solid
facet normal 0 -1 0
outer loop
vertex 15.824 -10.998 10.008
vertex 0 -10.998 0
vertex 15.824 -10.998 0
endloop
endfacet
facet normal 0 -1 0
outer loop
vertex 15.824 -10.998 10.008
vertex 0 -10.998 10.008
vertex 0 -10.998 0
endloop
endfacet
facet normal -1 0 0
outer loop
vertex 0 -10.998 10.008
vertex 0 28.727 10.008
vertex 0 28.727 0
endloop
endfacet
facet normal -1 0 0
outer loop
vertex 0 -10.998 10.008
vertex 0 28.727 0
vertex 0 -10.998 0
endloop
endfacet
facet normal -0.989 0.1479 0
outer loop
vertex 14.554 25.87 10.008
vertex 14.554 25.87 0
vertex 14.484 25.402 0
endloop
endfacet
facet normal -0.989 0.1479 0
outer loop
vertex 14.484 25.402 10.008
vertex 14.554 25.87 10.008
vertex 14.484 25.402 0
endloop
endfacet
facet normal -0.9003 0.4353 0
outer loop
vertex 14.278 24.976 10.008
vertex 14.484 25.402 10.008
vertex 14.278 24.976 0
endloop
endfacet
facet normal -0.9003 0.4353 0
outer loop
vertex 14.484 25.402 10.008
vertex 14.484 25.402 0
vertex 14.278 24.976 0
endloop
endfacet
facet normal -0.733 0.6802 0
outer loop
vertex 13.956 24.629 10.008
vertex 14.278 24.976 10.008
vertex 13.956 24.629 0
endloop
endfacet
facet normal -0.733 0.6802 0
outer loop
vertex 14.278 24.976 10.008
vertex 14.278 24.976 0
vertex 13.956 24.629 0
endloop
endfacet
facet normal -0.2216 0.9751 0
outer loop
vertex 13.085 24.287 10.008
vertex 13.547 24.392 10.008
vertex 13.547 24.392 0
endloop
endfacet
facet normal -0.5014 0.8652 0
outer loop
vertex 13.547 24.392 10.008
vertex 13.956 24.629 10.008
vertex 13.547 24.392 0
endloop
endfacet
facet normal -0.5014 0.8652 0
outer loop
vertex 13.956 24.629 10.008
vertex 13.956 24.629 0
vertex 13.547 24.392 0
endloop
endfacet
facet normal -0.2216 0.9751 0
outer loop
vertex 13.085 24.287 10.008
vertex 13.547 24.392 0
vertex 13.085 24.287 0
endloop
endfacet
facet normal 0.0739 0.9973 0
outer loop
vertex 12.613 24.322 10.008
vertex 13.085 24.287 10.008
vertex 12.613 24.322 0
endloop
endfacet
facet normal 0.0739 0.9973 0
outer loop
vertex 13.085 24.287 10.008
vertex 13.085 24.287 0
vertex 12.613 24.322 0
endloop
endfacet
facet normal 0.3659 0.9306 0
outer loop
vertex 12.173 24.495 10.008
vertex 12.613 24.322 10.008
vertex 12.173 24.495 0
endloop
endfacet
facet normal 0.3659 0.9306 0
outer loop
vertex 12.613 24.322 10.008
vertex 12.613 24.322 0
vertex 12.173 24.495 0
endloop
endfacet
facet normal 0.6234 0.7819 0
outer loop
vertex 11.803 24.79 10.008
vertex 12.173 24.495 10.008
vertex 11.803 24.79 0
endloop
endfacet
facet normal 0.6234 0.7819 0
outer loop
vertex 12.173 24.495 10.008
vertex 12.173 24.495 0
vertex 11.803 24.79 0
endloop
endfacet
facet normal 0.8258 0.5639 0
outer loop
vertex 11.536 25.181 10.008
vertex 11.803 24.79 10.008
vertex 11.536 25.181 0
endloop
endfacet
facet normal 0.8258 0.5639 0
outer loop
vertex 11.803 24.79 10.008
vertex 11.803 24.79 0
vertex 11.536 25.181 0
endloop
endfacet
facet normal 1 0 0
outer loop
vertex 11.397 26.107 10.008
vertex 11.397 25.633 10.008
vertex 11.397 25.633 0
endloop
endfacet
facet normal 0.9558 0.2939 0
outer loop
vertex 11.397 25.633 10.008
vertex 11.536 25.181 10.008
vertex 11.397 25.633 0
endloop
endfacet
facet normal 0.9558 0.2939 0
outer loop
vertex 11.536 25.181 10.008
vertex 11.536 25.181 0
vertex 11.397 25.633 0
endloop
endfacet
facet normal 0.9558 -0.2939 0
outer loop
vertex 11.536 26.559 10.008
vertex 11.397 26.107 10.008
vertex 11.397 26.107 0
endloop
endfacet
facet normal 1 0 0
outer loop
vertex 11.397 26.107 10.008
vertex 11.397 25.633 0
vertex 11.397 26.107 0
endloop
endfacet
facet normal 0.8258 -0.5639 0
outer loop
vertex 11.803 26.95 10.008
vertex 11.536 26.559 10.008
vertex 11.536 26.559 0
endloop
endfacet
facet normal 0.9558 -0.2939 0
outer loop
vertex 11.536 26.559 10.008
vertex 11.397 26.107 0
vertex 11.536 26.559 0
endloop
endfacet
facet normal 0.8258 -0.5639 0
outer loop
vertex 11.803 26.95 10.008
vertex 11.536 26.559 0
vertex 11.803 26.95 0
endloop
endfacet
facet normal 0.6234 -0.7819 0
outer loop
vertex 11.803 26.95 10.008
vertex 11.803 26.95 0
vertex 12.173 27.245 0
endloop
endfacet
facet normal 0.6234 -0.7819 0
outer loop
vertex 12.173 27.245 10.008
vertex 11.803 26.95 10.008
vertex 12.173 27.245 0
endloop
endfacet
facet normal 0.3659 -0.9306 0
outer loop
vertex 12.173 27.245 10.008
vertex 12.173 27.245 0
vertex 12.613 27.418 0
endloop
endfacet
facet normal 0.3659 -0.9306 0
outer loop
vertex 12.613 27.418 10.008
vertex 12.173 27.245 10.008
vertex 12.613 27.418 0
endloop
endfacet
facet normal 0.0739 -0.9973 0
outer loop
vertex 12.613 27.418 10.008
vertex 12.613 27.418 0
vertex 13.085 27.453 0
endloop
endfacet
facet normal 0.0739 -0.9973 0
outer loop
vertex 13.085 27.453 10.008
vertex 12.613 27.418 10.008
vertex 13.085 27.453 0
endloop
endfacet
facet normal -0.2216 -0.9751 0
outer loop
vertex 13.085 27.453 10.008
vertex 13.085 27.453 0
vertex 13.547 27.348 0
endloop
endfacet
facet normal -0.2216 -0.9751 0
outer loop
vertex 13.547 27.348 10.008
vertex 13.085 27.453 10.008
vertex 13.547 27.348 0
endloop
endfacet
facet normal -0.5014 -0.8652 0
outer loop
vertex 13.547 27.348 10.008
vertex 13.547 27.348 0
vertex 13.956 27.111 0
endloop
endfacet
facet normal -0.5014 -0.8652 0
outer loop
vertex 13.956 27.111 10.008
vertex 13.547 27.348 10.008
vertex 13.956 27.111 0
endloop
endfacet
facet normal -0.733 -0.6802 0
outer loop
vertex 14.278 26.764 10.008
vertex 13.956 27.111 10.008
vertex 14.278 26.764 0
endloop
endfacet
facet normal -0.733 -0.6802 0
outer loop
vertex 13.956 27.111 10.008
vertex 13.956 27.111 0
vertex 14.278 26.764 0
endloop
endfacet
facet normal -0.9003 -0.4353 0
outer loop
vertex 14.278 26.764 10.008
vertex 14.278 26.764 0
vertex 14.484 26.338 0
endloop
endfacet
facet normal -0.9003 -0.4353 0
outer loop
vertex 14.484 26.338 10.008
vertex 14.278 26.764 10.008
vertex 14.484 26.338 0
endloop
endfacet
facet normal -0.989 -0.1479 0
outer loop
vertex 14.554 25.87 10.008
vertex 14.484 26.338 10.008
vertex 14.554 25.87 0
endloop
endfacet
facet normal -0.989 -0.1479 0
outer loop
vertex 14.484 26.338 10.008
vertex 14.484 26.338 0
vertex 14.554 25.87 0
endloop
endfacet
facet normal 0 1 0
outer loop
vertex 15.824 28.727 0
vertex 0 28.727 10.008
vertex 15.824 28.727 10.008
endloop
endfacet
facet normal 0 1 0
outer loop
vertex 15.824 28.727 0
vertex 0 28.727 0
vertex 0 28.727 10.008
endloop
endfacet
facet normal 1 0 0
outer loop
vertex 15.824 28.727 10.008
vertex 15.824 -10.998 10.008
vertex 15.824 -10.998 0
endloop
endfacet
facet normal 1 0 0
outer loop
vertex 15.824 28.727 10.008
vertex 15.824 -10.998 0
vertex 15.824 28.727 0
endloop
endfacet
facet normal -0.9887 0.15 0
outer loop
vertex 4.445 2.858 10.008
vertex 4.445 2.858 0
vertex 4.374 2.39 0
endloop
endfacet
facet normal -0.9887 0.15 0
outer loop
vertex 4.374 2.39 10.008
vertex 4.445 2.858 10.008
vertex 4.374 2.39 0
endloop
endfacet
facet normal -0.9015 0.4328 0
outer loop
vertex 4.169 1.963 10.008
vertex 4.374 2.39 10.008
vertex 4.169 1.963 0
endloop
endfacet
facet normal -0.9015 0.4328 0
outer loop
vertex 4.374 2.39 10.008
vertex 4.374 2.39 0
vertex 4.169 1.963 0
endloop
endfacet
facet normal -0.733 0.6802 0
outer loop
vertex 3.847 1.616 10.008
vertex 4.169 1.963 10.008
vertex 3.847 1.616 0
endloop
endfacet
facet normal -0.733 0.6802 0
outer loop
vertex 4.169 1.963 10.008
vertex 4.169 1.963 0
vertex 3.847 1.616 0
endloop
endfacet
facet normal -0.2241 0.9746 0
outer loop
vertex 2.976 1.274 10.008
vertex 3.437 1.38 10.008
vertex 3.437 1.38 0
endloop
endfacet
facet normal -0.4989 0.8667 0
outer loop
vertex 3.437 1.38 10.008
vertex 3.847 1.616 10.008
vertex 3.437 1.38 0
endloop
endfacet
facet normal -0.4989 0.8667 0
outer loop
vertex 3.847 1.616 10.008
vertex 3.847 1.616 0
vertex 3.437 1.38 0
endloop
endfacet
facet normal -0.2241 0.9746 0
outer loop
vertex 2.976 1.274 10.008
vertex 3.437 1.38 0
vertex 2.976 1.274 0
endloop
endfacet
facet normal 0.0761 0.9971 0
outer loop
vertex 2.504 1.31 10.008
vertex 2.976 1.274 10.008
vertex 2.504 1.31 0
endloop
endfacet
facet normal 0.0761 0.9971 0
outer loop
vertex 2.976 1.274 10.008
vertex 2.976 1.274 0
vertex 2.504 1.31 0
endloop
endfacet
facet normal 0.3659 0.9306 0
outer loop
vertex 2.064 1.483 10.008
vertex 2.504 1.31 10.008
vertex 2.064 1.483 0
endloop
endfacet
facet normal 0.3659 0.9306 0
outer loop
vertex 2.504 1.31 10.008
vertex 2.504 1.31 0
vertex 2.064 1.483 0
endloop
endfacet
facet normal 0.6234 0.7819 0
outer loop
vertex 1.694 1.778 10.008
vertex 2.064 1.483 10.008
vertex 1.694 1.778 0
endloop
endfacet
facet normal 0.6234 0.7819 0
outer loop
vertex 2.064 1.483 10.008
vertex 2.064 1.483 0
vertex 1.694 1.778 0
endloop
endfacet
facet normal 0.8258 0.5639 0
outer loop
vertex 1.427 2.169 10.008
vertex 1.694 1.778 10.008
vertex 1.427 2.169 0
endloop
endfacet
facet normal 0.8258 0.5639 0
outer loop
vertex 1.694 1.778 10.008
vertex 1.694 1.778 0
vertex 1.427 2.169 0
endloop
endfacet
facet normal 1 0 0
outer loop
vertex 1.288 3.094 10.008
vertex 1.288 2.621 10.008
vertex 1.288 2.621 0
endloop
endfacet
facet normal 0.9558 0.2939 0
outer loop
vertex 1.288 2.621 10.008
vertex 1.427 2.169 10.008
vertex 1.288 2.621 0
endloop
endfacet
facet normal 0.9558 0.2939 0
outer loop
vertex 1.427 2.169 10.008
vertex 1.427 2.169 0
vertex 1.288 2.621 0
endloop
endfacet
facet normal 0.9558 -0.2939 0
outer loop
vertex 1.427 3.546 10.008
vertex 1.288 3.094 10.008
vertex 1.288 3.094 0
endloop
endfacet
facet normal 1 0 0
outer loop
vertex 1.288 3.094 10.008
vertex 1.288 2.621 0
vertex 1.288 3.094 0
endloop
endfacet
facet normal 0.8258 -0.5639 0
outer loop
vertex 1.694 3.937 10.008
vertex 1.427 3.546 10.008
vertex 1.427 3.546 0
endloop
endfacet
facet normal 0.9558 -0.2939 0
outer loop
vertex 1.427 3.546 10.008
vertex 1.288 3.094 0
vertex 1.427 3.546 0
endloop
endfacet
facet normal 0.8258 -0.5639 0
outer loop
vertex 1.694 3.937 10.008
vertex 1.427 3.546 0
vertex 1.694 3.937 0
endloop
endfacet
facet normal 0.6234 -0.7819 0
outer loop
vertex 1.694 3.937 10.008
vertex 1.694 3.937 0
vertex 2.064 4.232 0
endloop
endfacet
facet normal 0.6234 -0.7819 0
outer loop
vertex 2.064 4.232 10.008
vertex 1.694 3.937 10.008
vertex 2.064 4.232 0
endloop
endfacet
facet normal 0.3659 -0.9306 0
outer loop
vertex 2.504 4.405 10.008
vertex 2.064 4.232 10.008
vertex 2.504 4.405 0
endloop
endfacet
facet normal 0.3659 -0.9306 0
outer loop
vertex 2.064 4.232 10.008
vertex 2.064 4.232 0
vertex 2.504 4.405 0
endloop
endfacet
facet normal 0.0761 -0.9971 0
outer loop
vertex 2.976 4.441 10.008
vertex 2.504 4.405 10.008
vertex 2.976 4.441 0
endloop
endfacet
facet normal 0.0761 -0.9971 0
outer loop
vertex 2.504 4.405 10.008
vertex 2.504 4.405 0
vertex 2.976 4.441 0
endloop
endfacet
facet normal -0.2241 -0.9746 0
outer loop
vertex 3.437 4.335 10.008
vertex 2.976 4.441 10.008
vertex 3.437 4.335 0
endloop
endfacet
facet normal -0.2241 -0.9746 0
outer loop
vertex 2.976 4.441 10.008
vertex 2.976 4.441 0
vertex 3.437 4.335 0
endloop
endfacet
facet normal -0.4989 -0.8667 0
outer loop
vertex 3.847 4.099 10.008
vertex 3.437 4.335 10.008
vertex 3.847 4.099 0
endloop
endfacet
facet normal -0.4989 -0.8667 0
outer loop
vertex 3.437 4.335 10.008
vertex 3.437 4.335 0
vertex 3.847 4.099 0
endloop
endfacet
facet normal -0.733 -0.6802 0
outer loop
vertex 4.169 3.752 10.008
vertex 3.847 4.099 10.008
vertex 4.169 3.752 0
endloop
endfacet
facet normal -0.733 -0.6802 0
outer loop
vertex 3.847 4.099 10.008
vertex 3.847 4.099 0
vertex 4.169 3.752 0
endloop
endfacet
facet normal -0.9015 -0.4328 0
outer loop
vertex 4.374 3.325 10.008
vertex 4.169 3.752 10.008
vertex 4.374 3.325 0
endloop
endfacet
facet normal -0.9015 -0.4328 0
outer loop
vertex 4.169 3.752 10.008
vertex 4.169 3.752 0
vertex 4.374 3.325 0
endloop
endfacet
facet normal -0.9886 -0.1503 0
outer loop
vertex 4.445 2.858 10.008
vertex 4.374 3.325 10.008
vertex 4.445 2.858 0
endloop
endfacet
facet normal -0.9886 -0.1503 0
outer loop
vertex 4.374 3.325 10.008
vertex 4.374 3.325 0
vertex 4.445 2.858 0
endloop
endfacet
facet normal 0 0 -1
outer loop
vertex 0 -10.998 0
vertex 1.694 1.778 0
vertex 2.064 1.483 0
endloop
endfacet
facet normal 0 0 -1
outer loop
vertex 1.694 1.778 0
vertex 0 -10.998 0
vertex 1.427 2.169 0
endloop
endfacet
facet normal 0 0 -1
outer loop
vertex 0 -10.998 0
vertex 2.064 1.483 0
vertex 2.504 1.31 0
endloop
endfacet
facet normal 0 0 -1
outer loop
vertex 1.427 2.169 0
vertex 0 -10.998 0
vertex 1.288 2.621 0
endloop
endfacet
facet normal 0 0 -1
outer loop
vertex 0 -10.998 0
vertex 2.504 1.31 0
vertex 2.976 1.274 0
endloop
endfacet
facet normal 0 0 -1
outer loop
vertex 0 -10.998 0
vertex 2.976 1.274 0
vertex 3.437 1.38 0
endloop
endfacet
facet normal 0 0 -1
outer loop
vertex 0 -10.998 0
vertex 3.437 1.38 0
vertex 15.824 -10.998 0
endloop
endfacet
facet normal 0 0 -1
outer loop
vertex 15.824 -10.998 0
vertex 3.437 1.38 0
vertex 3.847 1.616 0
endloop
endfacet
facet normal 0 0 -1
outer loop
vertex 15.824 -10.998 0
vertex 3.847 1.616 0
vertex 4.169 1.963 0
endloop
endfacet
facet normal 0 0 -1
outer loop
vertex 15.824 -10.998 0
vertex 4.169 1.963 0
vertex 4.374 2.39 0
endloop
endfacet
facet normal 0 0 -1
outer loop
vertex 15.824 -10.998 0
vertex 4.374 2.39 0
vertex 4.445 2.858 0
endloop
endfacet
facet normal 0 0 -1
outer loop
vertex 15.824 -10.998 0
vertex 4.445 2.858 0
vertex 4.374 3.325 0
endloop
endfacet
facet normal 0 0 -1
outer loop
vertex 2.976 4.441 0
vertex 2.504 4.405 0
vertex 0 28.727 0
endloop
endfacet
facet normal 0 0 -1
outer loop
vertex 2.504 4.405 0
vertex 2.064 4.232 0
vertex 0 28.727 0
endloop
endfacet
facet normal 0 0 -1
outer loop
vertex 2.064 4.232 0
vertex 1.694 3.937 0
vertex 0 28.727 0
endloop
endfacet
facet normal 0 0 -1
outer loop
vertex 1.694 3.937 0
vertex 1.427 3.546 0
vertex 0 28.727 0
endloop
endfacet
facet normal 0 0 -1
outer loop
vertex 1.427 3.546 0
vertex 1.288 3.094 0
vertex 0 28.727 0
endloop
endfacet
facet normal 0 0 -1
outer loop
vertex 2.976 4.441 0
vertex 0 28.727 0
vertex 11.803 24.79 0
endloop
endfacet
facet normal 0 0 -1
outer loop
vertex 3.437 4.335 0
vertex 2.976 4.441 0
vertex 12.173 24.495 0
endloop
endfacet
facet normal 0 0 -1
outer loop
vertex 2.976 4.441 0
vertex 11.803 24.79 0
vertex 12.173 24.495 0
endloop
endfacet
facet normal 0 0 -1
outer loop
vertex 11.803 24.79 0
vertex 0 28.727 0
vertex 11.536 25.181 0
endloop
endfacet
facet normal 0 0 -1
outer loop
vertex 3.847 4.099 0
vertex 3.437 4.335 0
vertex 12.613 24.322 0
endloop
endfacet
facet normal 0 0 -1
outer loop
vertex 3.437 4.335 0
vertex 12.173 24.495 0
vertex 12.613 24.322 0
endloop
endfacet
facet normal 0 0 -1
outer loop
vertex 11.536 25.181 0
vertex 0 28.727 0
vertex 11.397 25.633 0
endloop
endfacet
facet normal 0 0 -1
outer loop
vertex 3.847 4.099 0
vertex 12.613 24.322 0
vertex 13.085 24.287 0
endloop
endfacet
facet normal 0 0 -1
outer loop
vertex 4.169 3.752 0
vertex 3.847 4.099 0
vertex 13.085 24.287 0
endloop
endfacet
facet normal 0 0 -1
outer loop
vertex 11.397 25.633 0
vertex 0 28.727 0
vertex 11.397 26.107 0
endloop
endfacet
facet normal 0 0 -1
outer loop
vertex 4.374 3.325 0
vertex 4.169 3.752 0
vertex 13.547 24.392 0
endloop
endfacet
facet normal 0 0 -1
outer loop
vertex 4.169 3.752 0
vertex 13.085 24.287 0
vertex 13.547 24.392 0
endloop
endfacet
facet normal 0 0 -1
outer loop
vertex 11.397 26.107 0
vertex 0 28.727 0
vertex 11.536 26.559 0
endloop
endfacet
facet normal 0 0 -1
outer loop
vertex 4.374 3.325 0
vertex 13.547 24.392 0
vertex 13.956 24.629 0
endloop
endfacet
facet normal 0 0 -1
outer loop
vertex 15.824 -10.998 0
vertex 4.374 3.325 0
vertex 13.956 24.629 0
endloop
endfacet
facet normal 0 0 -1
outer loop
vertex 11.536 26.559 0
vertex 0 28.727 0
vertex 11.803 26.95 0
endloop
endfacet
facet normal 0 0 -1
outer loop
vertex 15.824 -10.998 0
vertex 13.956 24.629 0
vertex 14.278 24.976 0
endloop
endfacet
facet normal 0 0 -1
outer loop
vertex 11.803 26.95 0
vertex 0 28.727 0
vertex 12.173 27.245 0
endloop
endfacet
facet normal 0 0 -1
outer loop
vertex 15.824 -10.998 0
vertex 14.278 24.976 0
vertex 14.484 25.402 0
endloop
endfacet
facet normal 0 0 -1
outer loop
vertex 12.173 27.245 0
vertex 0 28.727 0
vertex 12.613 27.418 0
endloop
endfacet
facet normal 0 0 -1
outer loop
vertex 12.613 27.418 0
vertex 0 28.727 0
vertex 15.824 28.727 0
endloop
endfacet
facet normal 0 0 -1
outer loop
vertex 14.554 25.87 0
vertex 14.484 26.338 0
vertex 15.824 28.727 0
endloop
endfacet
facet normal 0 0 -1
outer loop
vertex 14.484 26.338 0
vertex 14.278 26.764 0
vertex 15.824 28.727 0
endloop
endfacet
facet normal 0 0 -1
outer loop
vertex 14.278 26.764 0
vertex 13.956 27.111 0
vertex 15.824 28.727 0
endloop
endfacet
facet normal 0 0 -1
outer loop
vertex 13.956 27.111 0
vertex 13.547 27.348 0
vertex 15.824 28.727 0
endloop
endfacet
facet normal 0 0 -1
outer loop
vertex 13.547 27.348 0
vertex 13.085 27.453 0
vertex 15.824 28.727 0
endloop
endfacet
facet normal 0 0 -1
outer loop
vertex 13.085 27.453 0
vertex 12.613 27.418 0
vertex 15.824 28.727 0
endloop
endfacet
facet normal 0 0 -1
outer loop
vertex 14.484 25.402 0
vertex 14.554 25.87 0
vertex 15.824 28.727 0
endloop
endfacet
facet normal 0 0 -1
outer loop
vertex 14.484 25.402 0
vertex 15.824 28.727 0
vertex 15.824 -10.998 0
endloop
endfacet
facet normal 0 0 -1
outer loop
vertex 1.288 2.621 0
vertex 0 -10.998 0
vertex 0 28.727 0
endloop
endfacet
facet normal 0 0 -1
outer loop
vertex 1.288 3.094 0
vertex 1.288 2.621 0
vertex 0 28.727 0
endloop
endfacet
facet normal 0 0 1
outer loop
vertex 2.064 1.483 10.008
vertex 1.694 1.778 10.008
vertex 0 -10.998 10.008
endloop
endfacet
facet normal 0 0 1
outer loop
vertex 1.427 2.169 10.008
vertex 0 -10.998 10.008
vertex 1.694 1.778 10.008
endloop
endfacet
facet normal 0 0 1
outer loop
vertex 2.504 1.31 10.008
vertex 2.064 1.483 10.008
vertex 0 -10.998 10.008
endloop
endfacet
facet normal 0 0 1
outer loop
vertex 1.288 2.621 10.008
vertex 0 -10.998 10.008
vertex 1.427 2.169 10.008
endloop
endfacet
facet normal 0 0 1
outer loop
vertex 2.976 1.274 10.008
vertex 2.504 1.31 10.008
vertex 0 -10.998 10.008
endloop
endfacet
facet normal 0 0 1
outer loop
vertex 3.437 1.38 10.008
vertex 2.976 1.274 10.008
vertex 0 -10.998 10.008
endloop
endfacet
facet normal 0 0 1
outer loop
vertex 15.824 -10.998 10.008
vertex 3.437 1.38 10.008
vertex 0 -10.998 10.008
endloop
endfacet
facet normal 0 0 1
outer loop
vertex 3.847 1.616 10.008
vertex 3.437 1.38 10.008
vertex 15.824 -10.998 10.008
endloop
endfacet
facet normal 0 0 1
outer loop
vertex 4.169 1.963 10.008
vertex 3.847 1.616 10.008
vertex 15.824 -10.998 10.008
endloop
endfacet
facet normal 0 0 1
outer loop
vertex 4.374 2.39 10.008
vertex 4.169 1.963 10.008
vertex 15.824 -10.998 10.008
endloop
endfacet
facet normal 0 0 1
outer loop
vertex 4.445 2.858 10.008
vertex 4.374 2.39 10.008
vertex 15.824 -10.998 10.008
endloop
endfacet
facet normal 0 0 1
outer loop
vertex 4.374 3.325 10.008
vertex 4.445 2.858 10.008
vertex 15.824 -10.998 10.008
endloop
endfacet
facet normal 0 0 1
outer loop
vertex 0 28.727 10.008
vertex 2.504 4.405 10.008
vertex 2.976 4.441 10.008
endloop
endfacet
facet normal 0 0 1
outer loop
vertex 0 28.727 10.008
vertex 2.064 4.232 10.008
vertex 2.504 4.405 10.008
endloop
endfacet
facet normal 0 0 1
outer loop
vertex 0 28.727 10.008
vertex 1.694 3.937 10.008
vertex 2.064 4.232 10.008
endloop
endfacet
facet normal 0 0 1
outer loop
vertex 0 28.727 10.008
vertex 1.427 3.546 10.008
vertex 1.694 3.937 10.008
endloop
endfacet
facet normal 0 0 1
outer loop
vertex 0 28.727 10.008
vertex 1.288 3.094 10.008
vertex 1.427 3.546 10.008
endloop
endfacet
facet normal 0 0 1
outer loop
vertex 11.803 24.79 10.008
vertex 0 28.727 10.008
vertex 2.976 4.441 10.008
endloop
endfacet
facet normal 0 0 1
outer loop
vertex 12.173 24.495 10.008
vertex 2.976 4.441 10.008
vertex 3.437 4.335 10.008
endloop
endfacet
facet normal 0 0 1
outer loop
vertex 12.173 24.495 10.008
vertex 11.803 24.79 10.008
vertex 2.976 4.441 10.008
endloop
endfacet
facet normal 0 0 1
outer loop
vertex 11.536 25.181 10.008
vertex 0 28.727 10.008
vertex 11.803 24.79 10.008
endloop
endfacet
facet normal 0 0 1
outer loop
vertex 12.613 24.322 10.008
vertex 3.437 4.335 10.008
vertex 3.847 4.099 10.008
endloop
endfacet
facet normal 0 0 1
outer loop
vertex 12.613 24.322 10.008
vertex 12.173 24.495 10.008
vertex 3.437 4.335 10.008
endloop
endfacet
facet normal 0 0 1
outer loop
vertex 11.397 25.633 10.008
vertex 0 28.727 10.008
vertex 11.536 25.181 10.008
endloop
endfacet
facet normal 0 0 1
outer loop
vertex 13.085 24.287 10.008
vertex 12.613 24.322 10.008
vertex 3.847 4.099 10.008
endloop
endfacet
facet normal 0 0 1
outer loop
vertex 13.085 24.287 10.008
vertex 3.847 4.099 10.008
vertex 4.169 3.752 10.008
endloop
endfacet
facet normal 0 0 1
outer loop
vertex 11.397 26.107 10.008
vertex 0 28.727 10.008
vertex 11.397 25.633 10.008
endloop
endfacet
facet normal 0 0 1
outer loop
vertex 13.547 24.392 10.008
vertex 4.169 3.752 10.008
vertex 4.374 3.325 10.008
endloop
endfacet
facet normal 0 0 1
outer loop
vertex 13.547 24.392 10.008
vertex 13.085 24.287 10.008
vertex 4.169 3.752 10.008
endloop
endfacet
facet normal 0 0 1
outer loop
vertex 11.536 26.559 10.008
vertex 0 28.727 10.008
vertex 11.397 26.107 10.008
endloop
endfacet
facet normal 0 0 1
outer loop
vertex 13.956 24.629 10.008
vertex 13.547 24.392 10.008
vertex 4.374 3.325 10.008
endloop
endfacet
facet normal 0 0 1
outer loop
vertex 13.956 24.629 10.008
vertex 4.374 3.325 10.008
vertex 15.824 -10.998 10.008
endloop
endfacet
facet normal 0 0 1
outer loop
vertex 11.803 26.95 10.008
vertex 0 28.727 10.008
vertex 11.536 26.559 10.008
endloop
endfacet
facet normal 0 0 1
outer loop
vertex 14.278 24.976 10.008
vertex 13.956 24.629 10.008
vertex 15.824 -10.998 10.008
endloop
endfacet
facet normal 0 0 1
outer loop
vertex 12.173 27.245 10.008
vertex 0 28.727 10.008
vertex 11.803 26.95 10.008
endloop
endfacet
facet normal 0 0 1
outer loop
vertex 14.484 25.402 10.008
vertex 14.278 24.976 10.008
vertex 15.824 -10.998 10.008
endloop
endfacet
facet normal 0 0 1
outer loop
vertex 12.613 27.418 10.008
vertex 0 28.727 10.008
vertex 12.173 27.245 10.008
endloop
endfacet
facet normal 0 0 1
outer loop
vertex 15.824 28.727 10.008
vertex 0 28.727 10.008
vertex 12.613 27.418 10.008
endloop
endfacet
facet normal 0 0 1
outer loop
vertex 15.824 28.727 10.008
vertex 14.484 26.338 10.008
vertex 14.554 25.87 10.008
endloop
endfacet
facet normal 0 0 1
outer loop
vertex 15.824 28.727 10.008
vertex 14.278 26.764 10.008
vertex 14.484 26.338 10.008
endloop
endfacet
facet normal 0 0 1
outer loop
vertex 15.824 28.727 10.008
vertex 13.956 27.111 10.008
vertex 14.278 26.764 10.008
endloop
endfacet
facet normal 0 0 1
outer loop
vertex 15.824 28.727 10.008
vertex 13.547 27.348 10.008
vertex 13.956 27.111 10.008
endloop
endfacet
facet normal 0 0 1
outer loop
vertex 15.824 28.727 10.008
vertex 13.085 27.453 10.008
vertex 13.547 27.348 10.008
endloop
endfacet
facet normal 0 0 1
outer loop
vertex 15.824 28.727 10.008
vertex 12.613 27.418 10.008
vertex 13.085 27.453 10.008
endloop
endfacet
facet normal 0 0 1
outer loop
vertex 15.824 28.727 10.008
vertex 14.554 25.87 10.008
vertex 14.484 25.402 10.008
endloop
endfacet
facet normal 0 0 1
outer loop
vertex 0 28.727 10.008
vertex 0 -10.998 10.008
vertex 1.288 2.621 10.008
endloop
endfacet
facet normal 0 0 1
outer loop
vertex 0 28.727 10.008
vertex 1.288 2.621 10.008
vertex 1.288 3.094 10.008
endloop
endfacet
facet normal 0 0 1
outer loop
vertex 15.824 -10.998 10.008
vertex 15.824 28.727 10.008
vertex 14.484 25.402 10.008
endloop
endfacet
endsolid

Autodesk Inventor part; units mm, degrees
ref_plane "YZ Plane" through (0, 0, 0) normal (1, 0, 0) x (0, 1, 0)
ref_plane "XZ Plane" through (0, 0, 0) normal (0, 1, 0) x (-1, 0, 0)
ref_plane "XY Plane" through (0, 0, 0) normal (0, 0, 1) x (1, 0, 0)
sketch "Sketch1" plane through (0, 0, 0) normal (0, 0, 1) x (1, 0, 0)
  line L0 (0, 0) -> (0, 28.7274)
  line L1 (0, 28.7274) -> (15.8242, 28.7274)
  line L2 (15.8242, 28.7274) -> (15.8242, 0)
  line L3 (15.8242, 0) -> (0, 0)
  circle A0 centre (12.9667, 25.8699) radius 1.5875
  circle A1 centre (12.9667, 25.8699) radius 2.8575
  circle A2 centre (2.8575, 2.8575) radius 1.5875
  circle A3 centre (2.8575, 2.8575) radius 2.8575
  dimension "d0" = 28.7274
  dimension "d1" = 15.8242
  dimension "d2" = 3.175
  dimension "d3" = 5.715
  dimension "d4" = 3.175
  dimension "d5" = 5.715
extrude "Extrusion1" add sketch "Sketch1" along normal blind 10.0076
sketch "Sketch2" plane through (0, 0, 10.0076) normal (0, 0, 1) x (1, 0, 0)
  line L0 (0, 0) -> (15.8242, 0) projected
  line L1 (15.8242, 28.7274) -> (0, 28.7274) projected
  line L2 (0, 0) -> (0, -10.9982)
  line L3 (0, -10.9982) -> (15.8242, -10.9982)
  line L4 (15.8242, -10.9982) -> (15.8242, 0)
  dimension "d8" = 10.9982
extrude "Extrusion2" add sketch "Sketch2" against normal blind 10.0076
properties part number "Limit Switch"
